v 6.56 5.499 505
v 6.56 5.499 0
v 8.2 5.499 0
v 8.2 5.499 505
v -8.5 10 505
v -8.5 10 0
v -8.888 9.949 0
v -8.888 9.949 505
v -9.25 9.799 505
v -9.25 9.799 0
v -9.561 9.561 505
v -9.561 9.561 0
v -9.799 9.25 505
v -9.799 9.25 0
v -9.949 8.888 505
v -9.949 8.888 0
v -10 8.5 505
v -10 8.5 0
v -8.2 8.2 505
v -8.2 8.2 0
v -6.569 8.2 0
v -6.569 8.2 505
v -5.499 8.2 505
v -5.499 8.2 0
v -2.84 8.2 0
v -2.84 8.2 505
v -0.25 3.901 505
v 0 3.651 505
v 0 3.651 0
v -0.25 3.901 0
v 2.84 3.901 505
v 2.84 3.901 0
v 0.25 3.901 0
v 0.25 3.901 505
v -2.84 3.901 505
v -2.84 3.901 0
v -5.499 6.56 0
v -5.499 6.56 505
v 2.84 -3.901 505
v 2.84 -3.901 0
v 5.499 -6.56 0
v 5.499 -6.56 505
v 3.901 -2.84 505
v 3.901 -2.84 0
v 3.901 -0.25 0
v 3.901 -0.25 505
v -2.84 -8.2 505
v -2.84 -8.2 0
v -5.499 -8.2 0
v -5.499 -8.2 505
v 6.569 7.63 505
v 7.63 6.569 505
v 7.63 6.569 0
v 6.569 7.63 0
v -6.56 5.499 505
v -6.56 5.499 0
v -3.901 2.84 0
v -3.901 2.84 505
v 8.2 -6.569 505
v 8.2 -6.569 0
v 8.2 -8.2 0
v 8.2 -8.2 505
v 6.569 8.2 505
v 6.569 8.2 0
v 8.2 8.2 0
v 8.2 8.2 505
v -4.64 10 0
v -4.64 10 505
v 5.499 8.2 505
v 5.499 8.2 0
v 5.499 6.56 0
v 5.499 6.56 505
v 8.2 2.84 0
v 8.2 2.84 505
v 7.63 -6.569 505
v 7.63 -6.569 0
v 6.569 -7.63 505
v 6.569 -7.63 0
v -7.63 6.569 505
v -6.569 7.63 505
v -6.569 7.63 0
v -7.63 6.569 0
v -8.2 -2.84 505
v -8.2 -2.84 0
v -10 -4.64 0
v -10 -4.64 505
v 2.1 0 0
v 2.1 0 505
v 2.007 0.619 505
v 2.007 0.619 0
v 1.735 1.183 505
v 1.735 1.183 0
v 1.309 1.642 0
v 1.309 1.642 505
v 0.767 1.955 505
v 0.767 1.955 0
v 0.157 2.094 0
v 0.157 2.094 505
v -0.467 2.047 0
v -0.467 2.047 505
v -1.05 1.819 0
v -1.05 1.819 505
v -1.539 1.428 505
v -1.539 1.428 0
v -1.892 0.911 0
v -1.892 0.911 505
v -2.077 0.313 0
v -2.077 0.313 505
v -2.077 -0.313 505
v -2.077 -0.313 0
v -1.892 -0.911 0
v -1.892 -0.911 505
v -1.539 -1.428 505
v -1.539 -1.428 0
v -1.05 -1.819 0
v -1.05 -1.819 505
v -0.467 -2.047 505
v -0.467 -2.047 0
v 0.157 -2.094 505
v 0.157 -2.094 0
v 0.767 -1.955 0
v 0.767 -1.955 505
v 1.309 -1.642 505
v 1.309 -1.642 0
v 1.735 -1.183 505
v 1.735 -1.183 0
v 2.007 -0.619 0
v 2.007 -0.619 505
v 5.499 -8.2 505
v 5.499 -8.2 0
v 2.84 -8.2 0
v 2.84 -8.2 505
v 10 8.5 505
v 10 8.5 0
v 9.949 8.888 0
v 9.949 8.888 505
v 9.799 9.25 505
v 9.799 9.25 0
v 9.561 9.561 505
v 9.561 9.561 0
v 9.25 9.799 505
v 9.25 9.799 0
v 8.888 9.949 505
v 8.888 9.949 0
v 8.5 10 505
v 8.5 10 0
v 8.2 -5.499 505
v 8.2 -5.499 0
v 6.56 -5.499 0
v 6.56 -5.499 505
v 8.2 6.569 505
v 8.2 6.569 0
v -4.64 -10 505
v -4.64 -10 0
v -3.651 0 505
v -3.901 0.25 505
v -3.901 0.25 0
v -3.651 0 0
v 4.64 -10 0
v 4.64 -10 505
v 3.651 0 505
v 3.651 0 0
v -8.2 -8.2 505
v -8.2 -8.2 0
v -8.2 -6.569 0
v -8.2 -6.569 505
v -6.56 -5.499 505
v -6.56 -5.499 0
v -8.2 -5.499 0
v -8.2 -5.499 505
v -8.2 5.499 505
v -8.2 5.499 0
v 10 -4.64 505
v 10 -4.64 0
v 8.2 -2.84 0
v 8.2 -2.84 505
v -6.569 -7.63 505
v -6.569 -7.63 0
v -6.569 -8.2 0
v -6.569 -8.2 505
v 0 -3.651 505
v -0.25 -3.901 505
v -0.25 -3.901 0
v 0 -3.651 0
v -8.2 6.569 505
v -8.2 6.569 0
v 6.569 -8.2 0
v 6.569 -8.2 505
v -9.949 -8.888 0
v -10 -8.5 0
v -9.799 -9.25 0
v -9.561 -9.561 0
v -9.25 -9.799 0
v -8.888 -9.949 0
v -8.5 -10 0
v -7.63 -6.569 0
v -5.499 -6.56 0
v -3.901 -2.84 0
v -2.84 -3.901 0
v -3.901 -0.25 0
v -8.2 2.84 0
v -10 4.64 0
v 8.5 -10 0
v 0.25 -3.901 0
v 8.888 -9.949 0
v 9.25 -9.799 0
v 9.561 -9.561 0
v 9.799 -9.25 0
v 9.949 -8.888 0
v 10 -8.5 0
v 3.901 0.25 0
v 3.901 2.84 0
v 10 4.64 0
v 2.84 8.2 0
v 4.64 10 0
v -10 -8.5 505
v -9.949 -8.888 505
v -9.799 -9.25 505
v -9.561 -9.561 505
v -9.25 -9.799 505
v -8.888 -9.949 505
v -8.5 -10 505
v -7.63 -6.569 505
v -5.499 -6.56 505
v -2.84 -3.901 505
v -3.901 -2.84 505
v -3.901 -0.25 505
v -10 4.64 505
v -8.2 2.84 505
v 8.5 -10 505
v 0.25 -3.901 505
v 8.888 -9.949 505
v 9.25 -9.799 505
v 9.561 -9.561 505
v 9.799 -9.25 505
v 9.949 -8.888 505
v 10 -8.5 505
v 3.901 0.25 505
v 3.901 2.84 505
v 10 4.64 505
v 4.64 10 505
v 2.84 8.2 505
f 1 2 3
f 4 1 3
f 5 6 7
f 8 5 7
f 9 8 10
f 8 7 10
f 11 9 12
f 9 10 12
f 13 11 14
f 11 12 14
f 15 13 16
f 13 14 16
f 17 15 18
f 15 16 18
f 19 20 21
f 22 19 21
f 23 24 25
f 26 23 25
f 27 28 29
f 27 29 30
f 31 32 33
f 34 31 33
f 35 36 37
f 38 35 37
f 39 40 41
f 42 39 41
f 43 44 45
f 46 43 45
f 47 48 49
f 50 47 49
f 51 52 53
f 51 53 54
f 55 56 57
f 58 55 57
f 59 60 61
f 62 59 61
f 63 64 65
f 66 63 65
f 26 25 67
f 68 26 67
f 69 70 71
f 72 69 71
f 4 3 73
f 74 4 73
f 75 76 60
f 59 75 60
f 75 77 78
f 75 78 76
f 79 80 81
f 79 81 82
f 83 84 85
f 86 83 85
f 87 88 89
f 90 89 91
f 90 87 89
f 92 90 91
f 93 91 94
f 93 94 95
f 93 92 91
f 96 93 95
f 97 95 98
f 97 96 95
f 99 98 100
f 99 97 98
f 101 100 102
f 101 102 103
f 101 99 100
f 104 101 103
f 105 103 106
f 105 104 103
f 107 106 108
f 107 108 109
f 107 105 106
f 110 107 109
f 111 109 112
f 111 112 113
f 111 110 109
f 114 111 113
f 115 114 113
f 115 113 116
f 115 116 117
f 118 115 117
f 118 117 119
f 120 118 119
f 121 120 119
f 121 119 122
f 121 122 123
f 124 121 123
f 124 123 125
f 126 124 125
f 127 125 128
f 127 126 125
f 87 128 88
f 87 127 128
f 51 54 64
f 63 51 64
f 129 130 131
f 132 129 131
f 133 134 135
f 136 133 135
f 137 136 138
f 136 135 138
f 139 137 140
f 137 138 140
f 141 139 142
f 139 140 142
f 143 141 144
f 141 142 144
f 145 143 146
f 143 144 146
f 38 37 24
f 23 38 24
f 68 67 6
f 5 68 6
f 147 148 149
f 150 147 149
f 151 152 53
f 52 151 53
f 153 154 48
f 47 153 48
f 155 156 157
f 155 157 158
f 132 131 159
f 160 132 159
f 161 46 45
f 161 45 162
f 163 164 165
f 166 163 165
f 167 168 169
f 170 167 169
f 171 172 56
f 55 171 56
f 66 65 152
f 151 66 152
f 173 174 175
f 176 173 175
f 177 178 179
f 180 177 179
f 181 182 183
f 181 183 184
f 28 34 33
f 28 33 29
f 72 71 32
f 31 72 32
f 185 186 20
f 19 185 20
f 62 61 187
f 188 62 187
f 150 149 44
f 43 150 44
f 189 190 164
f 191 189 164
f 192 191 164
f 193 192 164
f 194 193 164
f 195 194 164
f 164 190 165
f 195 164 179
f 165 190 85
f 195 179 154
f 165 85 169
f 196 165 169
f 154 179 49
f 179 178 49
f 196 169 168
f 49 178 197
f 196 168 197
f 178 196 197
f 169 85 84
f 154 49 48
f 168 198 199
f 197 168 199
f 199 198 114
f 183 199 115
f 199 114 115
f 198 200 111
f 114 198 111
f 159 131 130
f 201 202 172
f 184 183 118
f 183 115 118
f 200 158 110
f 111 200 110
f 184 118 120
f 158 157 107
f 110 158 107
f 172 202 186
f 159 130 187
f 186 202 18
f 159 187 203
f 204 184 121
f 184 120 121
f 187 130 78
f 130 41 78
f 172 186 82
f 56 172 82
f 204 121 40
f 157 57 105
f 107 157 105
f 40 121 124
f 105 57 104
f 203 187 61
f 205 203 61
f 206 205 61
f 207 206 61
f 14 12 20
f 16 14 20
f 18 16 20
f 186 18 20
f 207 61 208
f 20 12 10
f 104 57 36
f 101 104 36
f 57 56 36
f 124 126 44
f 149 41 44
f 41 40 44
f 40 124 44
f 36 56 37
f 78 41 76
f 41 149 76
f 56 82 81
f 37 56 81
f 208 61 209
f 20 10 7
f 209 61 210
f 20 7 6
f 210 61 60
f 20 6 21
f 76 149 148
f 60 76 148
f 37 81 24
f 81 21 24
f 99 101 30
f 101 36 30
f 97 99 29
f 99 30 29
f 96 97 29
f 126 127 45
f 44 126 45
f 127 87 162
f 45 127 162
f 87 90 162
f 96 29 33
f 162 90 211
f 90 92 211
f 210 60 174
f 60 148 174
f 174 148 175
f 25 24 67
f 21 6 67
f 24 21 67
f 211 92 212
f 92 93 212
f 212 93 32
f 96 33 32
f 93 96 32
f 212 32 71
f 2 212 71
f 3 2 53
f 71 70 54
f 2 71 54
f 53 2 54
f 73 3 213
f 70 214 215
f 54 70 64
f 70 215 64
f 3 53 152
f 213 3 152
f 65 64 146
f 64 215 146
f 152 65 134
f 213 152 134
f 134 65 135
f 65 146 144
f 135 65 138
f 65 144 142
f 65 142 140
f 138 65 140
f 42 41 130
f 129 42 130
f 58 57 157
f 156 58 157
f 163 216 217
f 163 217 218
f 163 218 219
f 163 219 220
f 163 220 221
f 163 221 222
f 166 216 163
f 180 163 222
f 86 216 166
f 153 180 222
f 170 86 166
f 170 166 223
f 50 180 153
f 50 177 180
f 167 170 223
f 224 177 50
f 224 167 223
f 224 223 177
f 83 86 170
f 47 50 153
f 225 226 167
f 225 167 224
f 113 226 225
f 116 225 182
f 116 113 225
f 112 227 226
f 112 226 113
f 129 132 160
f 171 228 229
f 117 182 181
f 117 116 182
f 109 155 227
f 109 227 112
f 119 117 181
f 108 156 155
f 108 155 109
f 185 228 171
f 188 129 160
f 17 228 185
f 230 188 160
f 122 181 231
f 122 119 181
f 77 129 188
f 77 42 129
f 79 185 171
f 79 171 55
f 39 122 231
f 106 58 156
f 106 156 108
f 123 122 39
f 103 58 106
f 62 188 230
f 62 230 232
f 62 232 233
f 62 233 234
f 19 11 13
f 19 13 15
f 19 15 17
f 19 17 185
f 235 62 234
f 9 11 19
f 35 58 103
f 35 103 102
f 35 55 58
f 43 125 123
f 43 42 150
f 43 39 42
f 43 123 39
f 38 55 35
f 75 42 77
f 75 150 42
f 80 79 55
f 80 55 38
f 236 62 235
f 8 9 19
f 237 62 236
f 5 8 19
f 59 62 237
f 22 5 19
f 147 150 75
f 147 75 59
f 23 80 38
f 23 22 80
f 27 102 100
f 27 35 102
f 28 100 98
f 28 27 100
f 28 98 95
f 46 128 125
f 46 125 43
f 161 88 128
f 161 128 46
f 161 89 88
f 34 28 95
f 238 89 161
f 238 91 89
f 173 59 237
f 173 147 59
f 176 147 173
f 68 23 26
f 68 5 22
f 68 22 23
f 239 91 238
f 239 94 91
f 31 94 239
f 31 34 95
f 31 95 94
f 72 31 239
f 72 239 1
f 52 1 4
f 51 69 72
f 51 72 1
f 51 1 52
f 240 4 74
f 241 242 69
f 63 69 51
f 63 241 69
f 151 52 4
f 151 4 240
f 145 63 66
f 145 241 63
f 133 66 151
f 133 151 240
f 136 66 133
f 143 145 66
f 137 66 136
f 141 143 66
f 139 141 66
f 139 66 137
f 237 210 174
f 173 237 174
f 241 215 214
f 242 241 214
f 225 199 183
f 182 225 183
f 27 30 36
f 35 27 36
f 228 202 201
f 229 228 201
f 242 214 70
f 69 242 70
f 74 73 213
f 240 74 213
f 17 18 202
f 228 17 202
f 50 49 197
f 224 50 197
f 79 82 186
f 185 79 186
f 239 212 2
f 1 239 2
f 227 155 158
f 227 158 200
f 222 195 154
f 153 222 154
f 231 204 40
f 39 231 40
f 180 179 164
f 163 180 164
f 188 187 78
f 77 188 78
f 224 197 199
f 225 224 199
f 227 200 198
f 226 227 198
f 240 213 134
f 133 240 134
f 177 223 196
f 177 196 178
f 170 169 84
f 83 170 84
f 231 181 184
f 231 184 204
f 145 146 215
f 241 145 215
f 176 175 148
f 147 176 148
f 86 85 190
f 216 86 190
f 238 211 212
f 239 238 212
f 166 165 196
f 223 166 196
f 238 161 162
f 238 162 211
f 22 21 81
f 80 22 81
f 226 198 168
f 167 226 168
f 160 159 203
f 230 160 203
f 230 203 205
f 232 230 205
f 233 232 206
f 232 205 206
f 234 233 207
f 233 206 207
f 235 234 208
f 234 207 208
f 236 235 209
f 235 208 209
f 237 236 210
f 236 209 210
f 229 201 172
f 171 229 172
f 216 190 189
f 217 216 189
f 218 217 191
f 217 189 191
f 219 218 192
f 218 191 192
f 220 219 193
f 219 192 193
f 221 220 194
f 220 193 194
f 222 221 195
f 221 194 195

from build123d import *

# Parameters (mm, degrees)
F0_R     = 2.1
F1_DEPTH = 505


with BuildPart() as f1:
    # F0 (on Top) → F1 (new body)
    with BuildSketch(Plane.XY):
        with BuildLine():
            Line((10, 4.64), (10, 8.5))
            ThreePointArc((10, 8.5), (9.56066, 9.56066), (8.5, 10))
            Line((8.5, 10), (4.64, 10))
            Line((4.64, 10), (2.84, 8.2))
            Line((2.84, 8.2), (5.49934, 8.2))
            Line((5.49934, 8.2), (5.49934, 6.56))
            Line((5.49934, 6.56), (2.84, 3.90066))
            Line((2.84, 3.90066), (0.25, 3.90066))
            Line((0.25, 3.90066), (0, 3.65066))
            Line((0, 3.65066), (-0.25, 3.90066))
            Line((-0.25, 3.90066), (-2.84, 3.90066))
            Line((-2.84, 3.90066), (-5.49934, 6.56))
            Line((-5.49934, 6.56), (-5.49934, 8.2))
            Line((-5.49934, 8.2), (-2.84, 8.2))
            Line((-2.84, 8.2), (-4.64, 10))
            Line((-4.64, 10), (-8.5, 10))
            ThreePointArc((-8.5, 10), (-9.56066, 9.56066), (-10, 8.5))
            Line((-10, 8.5), (-10, 4.64))
            Line((-10, 4.64), (-8.2, 2.84))
            Line((-8.2, 2.84), (-8.2, 5.49934))
            Line((-8.2, 5.49934), (-6.56, 5.49934))
            Line((-6.56, 5.49934), (-3.90066, 2.84))
            Line((-3.90066, 2.84), (-3.90066, 0.25))
            Line((-3.90066, 0.25), (-3.65066, 0))
            Line((-3.65066, 0), (-3.90066, -0.25))
            Line((-3.90066, -0.25), (-3.90066, -2.84))
            Line((-3.90066, -2.84), (-6.56, -5.49934))
            Line((-6.56, -5.49934), (-8.2, -5.49934))
            Line((-8.2, -5.49934), (-8.2, -2.84))
            Line((-8.2, -2.84), (-10, -4.64))
            Line((-10, -4.64), (-10, -8.5))
            ThreePointArc((-10, -8.5), (-9.56066, -9.56066), (-8.5, -10))
            Line((-8.5, -10), (-4.64, -10))
            Line((-4.64, -10), (-2.84, -8.2))
            Line((-2.84, -8.2), (-5.49934, -8.2))
            Line((-5.49934, -8.2), (-5.49934, -6.56))
            Line((-5.49934, -6.56), (-2.84, -3.90066))
            Line((-2.84, -3.90066), (-0.25, -3.90066))
            Line((-0.25, -3.90066), (0, -3.65066))
            Line((0, -3.65066), (0.25, -3.90066))
            Line((0.25, -3.90066), (2.84, -3.90066))
            Line((2.84, -3.90066), (5.49934, -6.56))
            Line((5.49934, -6.56), (5.49934, -8.2))
            Line((5.49934, -8.2), (2.84, -8.2))
            Line((2.84, -8.2), (4.64, -10))
            Line((4.64, -10), (8.5, -10))
            ThreePointArc((8.5, -10), (9.56066, -9.56066), (10, -8.5))
            Line((10, -8.5), (10, -4.64))
            Line((10, -4.64), (8.2, -2.84))
            Line((8.2, -2.84), (8.2, -5.49934))
            Line((8.2, -5.49934), (6.56, -5.49934))
            Line((6.56, -5.49934), (3.90066, -2.84))
            Line((3.90066, -2.84), (3.90066, -0.25))
            Line((3.90066, -0.25), (3.65066, 0))
            Line((3.65066, 0), (3.90066, 0.25))
            Line((3.90066, 0.25), (3.90066, 2.84))
            Line((3.90066, 2.84), (6.56, 5.49934))
            Line((6.56, 5.49934), (8.2, 5.49934))
            Line((8.2, 5.49934), (8.2, 2.84))
            Line((8.2, 2.84), (10, 4.64))
        make_face()
        Polygon((-6.56934, -7.63), (-6.56934, -8.2), (-8.2, -8.2), (-8.2, -6.56934), (-7.63, -6.56934), align=None, mode=Mode.SUBTRACT)
        Polygon((8.2, -8.2), (6.56934, -8.2), (6.56934, -7.63), (7.63, -6.56934), (8.2, -6.56934), align=None, mode=Mode.SUBTRACT)
        Polygon((-7.63, 6.56934), (-8.2, 6.56934), (-8.2, 8.2), (-6.56934, 8.2), (-6.56934, 7.63), align=None, mode=Mode.SUBTRACT)
        Circle(F0_R, mode=Mode.SUBTRACT)
        Polygon((6.56934, 7.63), (6.56934, 8.2), (8.2, 8.2), (8.2, 6.56934), (7.63, 6.56934), align=None, mode=Mode.SUBTRACT)
    extrude(amount=F1_DEPTH)


solid = f1.part
